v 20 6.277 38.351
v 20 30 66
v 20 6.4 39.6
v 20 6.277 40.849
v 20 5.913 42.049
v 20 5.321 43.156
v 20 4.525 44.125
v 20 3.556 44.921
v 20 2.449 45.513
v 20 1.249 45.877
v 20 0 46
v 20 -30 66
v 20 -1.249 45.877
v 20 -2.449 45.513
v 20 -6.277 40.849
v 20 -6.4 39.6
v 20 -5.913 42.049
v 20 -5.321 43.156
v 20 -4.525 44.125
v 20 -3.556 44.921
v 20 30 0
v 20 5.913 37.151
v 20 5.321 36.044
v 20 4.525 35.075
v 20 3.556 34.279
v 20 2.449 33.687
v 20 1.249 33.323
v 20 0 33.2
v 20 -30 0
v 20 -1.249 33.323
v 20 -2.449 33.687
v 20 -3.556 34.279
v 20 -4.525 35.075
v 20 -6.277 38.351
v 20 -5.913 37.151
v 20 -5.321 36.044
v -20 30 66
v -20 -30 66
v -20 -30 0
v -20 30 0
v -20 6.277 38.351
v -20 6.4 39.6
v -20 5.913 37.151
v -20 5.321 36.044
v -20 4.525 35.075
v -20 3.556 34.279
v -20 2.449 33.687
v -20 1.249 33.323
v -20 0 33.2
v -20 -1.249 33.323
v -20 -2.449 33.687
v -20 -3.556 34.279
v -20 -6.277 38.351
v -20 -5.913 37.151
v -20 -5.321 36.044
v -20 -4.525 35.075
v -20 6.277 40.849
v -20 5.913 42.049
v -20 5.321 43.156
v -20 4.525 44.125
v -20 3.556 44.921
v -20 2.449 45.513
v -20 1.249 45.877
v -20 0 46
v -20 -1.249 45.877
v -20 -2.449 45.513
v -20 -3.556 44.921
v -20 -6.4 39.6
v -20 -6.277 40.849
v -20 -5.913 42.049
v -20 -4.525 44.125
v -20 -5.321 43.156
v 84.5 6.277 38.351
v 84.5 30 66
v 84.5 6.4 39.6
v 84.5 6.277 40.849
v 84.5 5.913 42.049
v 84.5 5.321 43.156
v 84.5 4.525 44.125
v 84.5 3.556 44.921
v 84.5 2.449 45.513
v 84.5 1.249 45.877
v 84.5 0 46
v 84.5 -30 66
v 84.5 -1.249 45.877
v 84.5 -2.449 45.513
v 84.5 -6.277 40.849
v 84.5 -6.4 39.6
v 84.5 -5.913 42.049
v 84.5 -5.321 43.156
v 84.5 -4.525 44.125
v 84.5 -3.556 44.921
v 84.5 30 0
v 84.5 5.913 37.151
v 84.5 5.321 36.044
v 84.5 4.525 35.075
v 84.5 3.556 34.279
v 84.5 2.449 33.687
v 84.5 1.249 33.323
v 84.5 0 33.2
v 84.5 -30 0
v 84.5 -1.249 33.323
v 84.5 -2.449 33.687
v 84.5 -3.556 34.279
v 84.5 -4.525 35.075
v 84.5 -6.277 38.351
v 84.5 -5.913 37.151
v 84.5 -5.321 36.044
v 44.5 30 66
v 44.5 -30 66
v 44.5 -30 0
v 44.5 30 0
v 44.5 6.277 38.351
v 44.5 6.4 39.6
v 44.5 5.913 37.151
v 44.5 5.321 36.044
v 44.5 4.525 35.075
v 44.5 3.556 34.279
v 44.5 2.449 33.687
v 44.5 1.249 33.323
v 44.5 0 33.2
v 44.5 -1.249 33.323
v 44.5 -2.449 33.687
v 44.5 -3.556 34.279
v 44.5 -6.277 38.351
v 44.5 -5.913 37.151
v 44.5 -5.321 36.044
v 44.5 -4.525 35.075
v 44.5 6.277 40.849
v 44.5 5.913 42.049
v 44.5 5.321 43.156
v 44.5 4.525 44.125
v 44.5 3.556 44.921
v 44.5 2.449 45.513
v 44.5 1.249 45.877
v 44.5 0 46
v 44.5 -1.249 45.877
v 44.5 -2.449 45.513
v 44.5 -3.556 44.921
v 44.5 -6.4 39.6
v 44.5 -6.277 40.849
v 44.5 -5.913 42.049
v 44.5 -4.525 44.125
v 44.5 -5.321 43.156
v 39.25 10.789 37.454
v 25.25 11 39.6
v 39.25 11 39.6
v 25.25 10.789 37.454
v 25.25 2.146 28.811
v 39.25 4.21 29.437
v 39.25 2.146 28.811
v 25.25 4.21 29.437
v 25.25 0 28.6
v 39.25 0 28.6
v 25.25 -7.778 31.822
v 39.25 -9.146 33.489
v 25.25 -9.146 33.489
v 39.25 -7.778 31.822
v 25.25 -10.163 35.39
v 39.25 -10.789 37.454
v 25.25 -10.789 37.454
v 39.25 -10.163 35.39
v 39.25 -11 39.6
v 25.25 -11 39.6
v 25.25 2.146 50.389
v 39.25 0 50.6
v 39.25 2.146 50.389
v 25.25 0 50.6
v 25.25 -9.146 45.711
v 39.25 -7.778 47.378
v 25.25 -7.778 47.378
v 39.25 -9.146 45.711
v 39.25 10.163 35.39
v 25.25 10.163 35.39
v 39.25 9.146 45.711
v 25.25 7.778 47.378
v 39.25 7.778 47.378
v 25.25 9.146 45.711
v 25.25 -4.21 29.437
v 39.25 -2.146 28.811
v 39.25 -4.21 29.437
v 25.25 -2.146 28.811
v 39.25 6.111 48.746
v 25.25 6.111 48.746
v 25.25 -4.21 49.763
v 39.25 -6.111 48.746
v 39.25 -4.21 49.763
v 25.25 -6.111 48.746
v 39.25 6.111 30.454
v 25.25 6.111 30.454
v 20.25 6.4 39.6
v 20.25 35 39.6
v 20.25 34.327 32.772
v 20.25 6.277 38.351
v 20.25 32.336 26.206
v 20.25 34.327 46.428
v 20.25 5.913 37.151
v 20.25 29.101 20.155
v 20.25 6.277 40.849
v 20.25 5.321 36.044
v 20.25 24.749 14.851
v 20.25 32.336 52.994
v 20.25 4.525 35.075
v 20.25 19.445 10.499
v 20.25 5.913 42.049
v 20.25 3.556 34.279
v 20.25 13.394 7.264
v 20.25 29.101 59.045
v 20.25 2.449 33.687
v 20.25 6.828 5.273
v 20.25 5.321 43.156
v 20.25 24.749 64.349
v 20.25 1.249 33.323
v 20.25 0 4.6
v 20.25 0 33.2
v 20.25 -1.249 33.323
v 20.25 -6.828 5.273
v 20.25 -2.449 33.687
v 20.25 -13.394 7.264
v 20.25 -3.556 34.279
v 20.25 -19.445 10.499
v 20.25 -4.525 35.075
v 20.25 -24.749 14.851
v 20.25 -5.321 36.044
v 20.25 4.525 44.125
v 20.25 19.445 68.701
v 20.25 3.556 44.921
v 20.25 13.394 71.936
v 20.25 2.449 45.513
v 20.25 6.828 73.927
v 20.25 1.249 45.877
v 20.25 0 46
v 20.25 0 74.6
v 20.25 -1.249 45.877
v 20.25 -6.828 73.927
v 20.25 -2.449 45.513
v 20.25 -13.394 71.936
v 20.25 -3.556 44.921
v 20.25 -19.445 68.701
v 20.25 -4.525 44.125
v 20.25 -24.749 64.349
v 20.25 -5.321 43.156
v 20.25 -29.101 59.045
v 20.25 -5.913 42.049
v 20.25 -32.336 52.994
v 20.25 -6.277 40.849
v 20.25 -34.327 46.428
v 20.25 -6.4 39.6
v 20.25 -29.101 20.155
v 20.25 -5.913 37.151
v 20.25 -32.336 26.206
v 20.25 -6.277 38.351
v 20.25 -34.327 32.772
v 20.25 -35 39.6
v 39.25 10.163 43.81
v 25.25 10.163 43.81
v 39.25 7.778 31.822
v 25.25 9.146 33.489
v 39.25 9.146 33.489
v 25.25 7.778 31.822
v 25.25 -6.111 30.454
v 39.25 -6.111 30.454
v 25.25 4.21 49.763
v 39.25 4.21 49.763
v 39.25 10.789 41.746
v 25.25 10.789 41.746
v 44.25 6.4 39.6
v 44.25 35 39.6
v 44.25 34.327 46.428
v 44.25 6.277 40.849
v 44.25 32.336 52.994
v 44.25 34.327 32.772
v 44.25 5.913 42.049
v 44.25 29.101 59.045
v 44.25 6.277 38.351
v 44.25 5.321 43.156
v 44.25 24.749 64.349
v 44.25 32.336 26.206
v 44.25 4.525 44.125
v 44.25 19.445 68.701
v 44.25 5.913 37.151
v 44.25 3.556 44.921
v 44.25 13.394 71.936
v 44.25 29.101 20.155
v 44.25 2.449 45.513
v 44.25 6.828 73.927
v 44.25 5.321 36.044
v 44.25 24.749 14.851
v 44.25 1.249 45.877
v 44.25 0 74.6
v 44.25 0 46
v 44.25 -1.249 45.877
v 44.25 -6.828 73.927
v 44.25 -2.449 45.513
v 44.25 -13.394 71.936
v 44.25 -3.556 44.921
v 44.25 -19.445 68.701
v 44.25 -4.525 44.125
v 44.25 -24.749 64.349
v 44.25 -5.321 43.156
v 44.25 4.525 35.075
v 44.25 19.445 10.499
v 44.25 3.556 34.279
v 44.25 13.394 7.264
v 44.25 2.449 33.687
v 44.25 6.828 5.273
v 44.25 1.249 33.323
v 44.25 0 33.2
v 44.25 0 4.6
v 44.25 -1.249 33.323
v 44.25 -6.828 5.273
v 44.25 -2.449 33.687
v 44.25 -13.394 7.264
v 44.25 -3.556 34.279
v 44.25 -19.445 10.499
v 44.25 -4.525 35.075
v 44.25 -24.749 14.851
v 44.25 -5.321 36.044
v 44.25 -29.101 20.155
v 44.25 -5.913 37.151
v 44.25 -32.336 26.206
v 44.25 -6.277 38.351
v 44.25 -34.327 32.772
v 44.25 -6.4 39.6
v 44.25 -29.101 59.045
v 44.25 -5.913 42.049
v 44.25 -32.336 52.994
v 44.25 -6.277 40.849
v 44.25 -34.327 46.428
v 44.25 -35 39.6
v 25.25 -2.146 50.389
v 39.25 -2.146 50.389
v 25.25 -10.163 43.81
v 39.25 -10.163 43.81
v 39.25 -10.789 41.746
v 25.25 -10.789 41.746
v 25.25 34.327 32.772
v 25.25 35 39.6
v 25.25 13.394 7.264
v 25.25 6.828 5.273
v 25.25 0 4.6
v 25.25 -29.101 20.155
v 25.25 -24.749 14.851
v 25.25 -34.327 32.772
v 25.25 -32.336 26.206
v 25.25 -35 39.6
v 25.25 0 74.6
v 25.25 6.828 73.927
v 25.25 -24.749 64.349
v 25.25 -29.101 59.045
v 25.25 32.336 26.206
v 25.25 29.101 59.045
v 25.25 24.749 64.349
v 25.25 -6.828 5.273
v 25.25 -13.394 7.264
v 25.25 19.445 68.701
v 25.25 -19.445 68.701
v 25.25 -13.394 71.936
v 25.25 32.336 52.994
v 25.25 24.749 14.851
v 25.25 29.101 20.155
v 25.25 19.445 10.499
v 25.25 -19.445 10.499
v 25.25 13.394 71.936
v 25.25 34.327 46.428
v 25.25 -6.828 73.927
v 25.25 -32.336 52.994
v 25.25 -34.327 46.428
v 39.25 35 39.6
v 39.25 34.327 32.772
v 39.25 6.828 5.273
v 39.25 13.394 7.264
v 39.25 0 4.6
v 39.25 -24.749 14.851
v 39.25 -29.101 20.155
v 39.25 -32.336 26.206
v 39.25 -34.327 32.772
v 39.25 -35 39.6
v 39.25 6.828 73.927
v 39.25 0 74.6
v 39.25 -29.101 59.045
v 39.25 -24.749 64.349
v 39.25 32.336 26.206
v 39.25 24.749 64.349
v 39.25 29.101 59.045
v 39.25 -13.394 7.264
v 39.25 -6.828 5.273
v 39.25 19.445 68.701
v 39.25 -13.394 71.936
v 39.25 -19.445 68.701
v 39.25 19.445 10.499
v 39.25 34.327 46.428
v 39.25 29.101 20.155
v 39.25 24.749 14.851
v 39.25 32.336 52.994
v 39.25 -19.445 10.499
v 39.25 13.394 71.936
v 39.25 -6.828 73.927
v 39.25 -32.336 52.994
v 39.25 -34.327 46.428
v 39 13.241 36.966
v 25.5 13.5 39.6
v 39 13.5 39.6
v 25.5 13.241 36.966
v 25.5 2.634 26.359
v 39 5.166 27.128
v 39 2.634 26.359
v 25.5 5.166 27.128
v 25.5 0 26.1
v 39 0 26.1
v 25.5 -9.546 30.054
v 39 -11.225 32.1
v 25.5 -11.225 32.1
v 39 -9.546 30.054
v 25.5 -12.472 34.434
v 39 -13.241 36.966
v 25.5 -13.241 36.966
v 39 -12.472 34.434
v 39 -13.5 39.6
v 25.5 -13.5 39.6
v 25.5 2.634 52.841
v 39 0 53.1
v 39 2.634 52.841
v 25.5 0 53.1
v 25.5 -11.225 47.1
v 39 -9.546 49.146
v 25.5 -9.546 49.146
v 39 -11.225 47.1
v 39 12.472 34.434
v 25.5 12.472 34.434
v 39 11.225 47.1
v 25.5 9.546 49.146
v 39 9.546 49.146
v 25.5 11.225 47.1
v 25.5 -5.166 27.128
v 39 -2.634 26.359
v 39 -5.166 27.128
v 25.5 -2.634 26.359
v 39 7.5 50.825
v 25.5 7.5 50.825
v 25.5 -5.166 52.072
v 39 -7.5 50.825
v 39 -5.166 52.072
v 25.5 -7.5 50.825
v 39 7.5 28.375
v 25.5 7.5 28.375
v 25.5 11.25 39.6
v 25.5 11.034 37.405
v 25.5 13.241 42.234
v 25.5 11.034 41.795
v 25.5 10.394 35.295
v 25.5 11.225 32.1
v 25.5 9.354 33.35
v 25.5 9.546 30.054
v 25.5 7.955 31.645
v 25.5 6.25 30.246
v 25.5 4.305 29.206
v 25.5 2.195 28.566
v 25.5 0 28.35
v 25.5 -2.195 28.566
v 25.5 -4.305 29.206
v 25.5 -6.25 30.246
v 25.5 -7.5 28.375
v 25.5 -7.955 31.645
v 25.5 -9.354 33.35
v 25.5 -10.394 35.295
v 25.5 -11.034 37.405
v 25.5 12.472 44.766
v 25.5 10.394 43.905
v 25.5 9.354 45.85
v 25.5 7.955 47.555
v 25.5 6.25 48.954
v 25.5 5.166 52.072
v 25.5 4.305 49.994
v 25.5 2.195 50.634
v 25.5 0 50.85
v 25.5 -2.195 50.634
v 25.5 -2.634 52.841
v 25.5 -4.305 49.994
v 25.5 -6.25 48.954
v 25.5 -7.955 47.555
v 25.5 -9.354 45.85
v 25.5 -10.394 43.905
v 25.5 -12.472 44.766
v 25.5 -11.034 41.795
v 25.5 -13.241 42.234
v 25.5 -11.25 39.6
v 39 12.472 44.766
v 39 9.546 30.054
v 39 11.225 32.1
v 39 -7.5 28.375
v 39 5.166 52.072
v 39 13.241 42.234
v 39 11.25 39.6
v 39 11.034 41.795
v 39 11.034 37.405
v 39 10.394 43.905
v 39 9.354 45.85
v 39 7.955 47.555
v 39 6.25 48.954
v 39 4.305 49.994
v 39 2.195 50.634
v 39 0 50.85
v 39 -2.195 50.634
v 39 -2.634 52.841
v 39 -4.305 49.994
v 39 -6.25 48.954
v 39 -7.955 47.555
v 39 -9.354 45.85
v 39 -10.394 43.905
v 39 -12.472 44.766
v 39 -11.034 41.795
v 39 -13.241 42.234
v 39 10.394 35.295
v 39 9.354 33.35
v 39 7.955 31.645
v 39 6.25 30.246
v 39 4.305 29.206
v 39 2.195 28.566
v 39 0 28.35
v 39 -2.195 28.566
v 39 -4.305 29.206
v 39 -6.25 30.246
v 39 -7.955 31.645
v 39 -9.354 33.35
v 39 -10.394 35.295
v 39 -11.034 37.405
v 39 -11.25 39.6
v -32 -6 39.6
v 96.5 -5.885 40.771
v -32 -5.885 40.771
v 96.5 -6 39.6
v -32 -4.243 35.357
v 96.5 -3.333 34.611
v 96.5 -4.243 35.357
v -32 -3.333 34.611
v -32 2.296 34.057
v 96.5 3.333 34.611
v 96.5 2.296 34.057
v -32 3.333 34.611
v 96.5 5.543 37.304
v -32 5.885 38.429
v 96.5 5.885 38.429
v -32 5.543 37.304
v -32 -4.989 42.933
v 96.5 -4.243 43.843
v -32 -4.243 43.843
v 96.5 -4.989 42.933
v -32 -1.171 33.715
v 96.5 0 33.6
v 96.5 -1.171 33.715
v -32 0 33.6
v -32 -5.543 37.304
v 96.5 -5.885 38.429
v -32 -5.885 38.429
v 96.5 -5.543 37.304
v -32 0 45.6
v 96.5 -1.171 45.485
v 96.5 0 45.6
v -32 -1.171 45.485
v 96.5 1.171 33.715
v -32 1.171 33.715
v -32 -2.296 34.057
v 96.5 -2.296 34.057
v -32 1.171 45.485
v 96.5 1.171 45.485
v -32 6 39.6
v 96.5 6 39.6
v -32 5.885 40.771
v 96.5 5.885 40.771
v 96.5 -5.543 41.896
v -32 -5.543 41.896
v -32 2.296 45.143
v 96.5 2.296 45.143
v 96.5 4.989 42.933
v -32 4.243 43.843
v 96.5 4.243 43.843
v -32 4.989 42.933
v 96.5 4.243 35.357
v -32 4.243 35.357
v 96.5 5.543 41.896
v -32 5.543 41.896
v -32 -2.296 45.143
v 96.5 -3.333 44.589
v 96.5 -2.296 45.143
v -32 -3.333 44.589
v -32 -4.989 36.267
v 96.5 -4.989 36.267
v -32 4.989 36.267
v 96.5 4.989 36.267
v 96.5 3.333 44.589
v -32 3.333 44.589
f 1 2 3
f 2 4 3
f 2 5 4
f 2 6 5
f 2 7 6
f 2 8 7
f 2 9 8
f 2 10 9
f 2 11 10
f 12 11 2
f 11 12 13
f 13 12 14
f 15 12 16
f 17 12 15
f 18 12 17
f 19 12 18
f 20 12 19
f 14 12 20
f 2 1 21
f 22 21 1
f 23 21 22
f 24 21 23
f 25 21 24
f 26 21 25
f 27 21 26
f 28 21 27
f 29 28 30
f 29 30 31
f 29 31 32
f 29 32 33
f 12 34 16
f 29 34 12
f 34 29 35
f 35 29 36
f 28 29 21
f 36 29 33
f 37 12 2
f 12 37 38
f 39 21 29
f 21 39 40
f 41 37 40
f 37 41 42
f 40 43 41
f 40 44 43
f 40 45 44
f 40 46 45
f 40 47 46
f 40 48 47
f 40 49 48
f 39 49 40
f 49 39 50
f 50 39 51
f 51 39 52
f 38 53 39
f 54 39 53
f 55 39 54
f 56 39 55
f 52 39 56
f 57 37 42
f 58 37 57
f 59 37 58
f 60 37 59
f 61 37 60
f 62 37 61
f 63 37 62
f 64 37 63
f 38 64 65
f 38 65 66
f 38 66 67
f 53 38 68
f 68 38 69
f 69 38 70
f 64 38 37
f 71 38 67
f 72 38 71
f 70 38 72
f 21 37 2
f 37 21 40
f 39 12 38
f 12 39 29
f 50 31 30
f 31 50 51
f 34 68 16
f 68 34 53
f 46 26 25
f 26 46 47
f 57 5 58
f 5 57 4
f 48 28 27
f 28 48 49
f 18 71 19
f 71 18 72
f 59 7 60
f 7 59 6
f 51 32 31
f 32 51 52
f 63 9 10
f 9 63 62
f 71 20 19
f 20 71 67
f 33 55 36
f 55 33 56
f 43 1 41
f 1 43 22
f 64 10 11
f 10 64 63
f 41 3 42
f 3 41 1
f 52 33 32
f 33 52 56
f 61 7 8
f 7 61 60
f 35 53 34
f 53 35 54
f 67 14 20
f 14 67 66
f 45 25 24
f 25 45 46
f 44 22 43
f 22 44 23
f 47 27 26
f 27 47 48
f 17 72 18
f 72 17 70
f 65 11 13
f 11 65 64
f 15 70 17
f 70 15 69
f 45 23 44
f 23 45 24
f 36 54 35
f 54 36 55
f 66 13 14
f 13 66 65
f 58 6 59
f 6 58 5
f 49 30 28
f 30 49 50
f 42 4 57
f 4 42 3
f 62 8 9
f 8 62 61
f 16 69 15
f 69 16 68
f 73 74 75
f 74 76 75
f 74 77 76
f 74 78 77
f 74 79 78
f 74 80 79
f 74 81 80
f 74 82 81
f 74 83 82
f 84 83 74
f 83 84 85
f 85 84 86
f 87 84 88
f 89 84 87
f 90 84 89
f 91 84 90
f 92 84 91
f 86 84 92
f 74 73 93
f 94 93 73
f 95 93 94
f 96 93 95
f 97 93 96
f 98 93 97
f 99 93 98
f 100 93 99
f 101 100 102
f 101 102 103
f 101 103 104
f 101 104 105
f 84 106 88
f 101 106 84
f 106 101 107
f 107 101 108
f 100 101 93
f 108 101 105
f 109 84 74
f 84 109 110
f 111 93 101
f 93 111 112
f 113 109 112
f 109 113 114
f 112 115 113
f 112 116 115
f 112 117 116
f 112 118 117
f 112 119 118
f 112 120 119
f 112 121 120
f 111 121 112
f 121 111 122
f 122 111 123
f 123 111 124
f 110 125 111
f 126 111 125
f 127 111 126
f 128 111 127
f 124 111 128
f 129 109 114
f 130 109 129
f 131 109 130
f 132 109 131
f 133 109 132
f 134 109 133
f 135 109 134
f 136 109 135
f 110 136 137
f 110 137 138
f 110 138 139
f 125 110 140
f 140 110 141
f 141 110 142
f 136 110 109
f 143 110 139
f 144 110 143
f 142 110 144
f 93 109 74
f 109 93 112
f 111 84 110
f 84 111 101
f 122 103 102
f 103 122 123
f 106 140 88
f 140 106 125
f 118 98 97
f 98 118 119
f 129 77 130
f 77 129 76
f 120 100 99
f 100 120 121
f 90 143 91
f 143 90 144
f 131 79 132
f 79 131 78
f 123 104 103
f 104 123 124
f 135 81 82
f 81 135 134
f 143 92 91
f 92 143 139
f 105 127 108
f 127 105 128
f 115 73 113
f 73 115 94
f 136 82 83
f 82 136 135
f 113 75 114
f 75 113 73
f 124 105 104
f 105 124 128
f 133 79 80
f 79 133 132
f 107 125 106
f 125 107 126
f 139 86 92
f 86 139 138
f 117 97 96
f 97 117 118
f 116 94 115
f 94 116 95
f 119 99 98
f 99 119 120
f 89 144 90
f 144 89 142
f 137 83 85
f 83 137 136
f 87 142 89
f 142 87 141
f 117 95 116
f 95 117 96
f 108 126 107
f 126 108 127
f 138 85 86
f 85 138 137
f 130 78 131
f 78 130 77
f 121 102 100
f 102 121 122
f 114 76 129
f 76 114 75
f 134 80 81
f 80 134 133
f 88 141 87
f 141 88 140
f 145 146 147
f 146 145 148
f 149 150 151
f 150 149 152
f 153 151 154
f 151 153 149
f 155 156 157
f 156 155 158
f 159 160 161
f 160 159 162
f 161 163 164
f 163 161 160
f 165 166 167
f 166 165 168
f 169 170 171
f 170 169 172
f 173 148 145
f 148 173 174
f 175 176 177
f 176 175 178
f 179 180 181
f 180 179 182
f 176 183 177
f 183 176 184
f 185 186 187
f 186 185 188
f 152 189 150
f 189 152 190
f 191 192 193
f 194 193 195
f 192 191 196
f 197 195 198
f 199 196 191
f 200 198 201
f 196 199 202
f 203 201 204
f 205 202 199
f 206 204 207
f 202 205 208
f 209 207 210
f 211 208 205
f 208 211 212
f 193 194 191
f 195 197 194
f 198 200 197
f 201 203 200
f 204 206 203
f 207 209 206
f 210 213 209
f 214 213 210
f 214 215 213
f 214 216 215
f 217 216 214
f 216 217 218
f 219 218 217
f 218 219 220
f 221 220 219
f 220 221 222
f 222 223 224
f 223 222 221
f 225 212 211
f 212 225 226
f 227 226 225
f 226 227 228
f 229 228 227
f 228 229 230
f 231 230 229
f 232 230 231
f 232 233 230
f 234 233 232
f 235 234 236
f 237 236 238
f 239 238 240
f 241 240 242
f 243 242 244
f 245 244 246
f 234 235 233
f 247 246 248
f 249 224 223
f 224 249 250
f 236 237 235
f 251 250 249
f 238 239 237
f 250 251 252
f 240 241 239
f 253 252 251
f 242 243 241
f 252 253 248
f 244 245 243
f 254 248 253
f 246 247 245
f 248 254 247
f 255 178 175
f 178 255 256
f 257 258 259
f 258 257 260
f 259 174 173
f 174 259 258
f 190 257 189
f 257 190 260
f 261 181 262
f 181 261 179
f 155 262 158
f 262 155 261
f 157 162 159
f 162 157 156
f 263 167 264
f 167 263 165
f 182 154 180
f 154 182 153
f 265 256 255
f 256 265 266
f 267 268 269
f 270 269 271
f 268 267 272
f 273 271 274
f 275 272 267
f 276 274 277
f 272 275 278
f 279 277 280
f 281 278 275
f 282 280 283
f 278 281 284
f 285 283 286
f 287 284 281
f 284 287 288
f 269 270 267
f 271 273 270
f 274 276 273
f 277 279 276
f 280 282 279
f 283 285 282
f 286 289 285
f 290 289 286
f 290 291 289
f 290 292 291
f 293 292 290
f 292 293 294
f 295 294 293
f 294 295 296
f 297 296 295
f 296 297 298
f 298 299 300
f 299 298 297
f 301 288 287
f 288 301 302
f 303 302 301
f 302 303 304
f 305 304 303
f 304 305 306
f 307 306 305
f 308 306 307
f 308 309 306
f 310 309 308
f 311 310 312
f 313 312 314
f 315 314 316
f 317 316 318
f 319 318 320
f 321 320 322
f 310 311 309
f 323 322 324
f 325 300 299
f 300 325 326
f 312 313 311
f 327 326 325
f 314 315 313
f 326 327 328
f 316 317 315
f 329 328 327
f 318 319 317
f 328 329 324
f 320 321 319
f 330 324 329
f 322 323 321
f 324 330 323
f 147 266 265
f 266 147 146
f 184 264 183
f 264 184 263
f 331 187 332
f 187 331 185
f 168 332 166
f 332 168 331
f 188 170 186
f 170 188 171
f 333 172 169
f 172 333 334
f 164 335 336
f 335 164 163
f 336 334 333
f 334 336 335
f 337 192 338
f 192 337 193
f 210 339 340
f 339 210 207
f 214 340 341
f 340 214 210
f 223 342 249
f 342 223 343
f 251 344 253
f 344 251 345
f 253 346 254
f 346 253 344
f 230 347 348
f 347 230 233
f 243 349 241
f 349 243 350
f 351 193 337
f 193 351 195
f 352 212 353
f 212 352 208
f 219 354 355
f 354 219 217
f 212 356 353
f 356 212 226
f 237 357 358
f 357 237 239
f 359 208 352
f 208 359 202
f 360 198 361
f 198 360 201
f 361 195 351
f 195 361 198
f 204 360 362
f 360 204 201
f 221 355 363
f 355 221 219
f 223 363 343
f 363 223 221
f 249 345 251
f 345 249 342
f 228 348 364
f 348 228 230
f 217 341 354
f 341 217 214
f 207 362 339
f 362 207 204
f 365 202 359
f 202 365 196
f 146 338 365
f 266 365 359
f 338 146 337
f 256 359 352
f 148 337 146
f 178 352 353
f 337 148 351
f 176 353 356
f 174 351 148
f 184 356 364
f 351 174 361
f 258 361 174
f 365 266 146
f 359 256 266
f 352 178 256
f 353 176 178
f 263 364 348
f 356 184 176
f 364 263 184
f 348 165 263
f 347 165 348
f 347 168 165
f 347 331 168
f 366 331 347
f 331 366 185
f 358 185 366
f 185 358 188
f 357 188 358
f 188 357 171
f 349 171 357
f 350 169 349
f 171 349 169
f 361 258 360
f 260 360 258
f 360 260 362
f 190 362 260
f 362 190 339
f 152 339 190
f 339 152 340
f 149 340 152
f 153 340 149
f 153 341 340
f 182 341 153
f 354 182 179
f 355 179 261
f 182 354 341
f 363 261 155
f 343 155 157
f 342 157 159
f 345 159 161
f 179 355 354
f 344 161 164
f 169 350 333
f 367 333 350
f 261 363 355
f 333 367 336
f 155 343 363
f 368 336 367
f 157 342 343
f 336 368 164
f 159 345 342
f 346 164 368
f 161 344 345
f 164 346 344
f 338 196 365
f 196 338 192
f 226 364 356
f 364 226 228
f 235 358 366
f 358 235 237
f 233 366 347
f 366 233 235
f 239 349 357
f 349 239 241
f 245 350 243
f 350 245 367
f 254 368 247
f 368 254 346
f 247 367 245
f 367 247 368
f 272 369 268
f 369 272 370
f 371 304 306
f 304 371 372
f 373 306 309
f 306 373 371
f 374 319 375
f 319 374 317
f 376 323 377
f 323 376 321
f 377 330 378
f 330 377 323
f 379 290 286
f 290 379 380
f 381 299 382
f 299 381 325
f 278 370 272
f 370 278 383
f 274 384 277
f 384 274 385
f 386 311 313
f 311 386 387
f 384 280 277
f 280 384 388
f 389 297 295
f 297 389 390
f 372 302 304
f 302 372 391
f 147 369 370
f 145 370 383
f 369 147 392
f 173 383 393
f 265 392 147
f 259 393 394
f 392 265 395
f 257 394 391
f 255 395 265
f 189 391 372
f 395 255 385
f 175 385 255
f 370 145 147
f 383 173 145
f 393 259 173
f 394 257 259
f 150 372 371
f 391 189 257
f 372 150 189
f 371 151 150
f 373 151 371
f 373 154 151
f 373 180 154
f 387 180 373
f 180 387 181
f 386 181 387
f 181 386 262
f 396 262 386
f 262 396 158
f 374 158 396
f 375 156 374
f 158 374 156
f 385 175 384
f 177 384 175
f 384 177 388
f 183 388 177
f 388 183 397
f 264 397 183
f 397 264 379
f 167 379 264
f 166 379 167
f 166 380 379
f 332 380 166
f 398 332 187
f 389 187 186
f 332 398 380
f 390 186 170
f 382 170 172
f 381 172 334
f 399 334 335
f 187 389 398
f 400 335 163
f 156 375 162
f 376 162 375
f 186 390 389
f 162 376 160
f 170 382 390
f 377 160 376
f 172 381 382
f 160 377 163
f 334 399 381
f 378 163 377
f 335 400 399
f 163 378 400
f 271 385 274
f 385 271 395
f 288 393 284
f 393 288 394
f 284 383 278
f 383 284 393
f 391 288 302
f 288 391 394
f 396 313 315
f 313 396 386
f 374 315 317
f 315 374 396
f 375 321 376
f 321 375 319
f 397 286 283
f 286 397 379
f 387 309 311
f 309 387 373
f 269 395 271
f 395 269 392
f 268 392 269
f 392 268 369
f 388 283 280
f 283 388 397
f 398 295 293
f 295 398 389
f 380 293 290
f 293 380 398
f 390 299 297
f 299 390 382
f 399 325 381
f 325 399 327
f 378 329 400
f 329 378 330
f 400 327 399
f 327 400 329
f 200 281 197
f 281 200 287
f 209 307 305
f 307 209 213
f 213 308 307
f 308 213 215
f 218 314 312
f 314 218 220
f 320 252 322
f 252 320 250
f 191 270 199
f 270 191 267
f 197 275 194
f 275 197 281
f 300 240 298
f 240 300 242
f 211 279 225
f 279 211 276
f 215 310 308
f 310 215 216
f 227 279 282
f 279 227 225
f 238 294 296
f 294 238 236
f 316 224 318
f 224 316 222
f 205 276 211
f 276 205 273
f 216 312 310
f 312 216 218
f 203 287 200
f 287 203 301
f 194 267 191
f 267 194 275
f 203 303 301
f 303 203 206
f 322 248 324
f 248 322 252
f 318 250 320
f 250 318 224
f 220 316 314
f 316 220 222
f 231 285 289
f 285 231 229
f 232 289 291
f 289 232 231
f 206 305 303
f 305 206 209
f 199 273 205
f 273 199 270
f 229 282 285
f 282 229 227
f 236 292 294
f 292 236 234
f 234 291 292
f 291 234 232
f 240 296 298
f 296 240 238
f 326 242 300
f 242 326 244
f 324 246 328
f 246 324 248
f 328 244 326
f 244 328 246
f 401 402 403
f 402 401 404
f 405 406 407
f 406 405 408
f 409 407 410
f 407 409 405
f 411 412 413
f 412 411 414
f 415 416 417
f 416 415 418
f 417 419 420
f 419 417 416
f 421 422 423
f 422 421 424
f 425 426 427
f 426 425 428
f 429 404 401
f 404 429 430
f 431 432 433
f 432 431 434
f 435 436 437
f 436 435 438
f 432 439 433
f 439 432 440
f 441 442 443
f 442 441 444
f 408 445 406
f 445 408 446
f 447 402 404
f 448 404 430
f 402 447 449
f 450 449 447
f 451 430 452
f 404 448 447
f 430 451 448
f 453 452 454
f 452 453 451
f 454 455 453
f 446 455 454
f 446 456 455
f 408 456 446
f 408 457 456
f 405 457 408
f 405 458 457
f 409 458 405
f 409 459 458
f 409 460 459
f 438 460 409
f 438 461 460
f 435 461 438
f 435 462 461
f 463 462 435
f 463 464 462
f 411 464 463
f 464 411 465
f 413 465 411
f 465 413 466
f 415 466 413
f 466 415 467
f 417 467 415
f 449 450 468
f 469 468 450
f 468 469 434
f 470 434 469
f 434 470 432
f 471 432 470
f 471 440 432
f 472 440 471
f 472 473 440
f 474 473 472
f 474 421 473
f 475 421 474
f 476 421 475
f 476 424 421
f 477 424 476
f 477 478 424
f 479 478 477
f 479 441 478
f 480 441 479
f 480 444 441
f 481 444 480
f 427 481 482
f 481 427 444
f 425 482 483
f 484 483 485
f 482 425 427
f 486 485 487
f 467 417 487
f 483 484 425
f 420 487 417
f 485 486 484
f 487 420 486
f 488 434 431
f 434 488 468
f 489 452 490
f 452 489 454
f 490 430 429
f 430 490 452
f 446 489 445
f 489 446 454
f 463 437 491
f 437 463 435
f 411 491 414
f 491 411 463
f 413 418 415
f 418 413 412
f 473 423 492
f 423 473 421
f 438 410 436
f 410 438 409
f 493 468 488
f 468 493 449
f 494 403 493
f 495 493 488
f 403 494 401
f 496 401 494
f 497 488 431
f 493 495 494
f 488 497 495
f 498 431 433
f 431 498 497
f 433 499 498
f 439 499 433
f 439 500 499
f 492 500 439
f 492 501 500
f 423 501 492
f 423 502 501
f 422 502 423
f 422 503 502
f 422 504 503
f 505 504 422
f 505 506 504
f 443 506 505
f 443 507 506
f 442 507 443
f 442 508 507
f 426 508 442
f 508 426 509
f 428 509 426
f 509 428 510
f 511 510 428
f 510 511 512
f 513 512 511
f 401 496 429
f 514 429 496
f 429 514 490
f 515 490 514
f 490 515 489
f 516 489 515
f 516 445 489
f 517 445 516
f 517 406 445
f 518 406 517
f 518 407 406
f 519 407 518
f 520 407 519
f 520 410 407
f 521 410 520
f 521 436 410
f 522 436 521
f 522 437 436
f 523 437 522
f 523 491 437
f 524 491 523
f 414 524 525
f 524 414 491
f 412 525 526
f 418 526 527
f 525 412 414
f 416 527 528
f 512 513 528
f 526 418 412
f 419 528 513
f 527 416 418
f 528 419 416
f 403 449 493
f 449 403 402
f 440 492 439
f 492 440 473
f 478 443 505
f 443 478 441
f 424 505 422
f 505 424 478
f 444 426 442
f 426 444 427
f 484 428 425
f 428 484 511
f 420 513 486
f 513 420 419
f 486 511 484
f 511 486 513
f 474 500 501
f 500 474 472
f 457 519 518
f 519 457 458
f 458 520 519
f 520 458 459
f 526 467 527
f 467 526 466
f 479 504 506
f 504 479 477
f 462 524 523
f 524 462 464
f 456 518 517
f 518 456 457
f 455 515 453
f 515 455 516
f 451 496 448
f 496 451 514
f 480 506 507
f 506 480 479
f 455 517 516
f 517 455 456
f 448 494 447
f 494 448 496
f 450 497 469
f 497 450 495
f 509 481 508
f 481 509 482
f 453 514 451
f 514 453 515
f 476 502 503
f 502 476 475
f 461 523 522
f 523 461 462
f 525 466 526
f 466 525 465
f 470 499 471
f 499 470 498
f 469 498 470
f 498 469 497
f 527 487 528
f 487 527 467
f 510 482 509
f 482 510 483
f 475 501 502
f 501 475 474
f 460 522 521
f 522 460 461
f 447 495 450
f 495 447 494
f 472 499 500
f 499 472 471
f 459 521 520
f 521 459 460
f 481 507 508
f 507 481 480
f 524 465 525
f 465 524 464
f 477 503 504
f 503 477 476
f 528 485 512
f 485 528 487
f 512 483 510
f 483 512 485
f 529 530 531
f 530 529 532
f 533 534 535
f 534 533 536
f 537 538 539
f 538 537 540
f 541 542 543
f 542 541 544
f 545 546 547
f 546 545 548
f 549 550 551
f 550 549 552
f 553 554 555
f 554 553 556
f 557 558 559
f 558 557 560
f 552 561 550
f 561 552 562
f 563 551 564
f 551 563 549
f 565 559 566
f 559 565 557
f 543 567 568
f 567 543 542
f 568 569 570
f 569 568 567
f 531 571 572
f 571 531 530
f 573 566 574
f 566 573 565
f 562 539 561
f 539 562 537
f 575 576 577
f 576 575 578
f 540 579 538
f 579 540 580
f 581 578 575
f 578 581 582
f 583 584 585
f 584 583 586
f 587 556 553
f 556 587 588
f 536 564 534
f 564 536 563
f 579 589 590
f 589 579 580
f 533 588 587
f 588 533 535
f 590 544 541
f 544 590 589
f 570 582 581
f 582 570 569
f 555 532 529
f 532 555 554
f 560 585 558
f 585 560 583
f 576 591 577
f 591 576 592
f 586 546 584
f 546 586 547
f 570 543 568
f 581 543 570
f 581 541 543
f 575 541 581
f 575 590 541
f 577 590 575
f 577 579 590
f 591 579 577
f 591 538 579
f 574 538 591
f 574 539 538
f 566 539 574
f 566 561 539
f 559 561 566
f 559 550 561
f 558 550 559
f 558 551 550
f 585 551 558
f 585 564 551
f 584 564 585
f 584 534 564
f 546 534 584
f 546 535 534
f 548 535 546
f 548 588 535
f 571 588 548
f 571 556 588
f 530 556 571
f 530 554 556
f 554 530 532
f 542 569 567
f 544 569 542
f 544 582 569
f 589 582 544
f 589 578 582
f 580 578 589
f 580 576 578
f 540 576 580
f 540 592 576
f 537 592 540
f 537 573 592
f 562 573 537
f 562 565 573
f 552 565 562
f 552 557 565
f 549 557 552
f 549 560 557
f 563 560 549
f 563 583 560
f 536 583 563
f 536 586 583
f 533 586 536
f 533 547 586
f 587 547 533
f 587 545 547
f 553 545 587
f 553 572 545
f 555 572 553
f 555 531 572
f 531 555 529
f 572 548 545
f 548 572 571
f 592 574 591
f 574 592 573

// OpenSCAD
$fn = 32;

// ------------------------------------------------------------------------
// Pulley assembly: d70 pulley with a belt, shaft d12
// Every part is its own module, assembly() places them once.
// ------------------------------------------------------------------------

// --- part 1 ---
module support1() {
  difference() {
    translate([-20, -30, 0]) cube([40, 60, 66]);
    translate([0, 0, 39.6]) rotate([0, 90, 0]) cylinder(h = 42, d = 12.8, center = true);
  }
}

// --- part 2 ---
module support2() {
  difference() {
    translate([-20, -30, 0]) cube([40, 60, 66]);
    translate([0, 0, 39.6]) rotate([0, 90, 0]) cylinder(h = 42, d = 12.8, center = true);
  }
}

// --- part 3 ---
module shaft() {
  translate([0, 0, -64.25]) cylinder(h = 128.5, d = 12);
}

// --- part 4 ---
module pulley() {
  difference() {
    union() {
      cylinder(h = 24, d = 22);
      cylinder(h = 5, d = 70);
      translate([0, 0, 19]) cylinder(h = 5, d = 70);
    }
    translate([0, 0, -1]) cylinder(h = 26, d = 12.8);
  }
}

// --- part 5 ---
module belt() {
  difference() {
      translate([0, 0, 0]) cylinder(h = 13.5, d = 27);
      translate([0, 0, -1]) cylinder(h = 15.5, d = 22.5);
    }
}

// --- assembly ---
module assembly() {
  translate([0, 0, 0]) rotate([0, 0, 0]) support1();
  translate([64.5, 0, 0]) rotate([0, 0, 0]) support2();
  translate([32.25, 0, 39.6]) rotate([0, 90, 0]) shaft();
  translate([20.25, 0, 39.6]) rotate([0, 90, 0]) pulley();
  translate([25.5, 0, 39.6]) rotate([0, 90, 0]) belt();
}

assembly();
